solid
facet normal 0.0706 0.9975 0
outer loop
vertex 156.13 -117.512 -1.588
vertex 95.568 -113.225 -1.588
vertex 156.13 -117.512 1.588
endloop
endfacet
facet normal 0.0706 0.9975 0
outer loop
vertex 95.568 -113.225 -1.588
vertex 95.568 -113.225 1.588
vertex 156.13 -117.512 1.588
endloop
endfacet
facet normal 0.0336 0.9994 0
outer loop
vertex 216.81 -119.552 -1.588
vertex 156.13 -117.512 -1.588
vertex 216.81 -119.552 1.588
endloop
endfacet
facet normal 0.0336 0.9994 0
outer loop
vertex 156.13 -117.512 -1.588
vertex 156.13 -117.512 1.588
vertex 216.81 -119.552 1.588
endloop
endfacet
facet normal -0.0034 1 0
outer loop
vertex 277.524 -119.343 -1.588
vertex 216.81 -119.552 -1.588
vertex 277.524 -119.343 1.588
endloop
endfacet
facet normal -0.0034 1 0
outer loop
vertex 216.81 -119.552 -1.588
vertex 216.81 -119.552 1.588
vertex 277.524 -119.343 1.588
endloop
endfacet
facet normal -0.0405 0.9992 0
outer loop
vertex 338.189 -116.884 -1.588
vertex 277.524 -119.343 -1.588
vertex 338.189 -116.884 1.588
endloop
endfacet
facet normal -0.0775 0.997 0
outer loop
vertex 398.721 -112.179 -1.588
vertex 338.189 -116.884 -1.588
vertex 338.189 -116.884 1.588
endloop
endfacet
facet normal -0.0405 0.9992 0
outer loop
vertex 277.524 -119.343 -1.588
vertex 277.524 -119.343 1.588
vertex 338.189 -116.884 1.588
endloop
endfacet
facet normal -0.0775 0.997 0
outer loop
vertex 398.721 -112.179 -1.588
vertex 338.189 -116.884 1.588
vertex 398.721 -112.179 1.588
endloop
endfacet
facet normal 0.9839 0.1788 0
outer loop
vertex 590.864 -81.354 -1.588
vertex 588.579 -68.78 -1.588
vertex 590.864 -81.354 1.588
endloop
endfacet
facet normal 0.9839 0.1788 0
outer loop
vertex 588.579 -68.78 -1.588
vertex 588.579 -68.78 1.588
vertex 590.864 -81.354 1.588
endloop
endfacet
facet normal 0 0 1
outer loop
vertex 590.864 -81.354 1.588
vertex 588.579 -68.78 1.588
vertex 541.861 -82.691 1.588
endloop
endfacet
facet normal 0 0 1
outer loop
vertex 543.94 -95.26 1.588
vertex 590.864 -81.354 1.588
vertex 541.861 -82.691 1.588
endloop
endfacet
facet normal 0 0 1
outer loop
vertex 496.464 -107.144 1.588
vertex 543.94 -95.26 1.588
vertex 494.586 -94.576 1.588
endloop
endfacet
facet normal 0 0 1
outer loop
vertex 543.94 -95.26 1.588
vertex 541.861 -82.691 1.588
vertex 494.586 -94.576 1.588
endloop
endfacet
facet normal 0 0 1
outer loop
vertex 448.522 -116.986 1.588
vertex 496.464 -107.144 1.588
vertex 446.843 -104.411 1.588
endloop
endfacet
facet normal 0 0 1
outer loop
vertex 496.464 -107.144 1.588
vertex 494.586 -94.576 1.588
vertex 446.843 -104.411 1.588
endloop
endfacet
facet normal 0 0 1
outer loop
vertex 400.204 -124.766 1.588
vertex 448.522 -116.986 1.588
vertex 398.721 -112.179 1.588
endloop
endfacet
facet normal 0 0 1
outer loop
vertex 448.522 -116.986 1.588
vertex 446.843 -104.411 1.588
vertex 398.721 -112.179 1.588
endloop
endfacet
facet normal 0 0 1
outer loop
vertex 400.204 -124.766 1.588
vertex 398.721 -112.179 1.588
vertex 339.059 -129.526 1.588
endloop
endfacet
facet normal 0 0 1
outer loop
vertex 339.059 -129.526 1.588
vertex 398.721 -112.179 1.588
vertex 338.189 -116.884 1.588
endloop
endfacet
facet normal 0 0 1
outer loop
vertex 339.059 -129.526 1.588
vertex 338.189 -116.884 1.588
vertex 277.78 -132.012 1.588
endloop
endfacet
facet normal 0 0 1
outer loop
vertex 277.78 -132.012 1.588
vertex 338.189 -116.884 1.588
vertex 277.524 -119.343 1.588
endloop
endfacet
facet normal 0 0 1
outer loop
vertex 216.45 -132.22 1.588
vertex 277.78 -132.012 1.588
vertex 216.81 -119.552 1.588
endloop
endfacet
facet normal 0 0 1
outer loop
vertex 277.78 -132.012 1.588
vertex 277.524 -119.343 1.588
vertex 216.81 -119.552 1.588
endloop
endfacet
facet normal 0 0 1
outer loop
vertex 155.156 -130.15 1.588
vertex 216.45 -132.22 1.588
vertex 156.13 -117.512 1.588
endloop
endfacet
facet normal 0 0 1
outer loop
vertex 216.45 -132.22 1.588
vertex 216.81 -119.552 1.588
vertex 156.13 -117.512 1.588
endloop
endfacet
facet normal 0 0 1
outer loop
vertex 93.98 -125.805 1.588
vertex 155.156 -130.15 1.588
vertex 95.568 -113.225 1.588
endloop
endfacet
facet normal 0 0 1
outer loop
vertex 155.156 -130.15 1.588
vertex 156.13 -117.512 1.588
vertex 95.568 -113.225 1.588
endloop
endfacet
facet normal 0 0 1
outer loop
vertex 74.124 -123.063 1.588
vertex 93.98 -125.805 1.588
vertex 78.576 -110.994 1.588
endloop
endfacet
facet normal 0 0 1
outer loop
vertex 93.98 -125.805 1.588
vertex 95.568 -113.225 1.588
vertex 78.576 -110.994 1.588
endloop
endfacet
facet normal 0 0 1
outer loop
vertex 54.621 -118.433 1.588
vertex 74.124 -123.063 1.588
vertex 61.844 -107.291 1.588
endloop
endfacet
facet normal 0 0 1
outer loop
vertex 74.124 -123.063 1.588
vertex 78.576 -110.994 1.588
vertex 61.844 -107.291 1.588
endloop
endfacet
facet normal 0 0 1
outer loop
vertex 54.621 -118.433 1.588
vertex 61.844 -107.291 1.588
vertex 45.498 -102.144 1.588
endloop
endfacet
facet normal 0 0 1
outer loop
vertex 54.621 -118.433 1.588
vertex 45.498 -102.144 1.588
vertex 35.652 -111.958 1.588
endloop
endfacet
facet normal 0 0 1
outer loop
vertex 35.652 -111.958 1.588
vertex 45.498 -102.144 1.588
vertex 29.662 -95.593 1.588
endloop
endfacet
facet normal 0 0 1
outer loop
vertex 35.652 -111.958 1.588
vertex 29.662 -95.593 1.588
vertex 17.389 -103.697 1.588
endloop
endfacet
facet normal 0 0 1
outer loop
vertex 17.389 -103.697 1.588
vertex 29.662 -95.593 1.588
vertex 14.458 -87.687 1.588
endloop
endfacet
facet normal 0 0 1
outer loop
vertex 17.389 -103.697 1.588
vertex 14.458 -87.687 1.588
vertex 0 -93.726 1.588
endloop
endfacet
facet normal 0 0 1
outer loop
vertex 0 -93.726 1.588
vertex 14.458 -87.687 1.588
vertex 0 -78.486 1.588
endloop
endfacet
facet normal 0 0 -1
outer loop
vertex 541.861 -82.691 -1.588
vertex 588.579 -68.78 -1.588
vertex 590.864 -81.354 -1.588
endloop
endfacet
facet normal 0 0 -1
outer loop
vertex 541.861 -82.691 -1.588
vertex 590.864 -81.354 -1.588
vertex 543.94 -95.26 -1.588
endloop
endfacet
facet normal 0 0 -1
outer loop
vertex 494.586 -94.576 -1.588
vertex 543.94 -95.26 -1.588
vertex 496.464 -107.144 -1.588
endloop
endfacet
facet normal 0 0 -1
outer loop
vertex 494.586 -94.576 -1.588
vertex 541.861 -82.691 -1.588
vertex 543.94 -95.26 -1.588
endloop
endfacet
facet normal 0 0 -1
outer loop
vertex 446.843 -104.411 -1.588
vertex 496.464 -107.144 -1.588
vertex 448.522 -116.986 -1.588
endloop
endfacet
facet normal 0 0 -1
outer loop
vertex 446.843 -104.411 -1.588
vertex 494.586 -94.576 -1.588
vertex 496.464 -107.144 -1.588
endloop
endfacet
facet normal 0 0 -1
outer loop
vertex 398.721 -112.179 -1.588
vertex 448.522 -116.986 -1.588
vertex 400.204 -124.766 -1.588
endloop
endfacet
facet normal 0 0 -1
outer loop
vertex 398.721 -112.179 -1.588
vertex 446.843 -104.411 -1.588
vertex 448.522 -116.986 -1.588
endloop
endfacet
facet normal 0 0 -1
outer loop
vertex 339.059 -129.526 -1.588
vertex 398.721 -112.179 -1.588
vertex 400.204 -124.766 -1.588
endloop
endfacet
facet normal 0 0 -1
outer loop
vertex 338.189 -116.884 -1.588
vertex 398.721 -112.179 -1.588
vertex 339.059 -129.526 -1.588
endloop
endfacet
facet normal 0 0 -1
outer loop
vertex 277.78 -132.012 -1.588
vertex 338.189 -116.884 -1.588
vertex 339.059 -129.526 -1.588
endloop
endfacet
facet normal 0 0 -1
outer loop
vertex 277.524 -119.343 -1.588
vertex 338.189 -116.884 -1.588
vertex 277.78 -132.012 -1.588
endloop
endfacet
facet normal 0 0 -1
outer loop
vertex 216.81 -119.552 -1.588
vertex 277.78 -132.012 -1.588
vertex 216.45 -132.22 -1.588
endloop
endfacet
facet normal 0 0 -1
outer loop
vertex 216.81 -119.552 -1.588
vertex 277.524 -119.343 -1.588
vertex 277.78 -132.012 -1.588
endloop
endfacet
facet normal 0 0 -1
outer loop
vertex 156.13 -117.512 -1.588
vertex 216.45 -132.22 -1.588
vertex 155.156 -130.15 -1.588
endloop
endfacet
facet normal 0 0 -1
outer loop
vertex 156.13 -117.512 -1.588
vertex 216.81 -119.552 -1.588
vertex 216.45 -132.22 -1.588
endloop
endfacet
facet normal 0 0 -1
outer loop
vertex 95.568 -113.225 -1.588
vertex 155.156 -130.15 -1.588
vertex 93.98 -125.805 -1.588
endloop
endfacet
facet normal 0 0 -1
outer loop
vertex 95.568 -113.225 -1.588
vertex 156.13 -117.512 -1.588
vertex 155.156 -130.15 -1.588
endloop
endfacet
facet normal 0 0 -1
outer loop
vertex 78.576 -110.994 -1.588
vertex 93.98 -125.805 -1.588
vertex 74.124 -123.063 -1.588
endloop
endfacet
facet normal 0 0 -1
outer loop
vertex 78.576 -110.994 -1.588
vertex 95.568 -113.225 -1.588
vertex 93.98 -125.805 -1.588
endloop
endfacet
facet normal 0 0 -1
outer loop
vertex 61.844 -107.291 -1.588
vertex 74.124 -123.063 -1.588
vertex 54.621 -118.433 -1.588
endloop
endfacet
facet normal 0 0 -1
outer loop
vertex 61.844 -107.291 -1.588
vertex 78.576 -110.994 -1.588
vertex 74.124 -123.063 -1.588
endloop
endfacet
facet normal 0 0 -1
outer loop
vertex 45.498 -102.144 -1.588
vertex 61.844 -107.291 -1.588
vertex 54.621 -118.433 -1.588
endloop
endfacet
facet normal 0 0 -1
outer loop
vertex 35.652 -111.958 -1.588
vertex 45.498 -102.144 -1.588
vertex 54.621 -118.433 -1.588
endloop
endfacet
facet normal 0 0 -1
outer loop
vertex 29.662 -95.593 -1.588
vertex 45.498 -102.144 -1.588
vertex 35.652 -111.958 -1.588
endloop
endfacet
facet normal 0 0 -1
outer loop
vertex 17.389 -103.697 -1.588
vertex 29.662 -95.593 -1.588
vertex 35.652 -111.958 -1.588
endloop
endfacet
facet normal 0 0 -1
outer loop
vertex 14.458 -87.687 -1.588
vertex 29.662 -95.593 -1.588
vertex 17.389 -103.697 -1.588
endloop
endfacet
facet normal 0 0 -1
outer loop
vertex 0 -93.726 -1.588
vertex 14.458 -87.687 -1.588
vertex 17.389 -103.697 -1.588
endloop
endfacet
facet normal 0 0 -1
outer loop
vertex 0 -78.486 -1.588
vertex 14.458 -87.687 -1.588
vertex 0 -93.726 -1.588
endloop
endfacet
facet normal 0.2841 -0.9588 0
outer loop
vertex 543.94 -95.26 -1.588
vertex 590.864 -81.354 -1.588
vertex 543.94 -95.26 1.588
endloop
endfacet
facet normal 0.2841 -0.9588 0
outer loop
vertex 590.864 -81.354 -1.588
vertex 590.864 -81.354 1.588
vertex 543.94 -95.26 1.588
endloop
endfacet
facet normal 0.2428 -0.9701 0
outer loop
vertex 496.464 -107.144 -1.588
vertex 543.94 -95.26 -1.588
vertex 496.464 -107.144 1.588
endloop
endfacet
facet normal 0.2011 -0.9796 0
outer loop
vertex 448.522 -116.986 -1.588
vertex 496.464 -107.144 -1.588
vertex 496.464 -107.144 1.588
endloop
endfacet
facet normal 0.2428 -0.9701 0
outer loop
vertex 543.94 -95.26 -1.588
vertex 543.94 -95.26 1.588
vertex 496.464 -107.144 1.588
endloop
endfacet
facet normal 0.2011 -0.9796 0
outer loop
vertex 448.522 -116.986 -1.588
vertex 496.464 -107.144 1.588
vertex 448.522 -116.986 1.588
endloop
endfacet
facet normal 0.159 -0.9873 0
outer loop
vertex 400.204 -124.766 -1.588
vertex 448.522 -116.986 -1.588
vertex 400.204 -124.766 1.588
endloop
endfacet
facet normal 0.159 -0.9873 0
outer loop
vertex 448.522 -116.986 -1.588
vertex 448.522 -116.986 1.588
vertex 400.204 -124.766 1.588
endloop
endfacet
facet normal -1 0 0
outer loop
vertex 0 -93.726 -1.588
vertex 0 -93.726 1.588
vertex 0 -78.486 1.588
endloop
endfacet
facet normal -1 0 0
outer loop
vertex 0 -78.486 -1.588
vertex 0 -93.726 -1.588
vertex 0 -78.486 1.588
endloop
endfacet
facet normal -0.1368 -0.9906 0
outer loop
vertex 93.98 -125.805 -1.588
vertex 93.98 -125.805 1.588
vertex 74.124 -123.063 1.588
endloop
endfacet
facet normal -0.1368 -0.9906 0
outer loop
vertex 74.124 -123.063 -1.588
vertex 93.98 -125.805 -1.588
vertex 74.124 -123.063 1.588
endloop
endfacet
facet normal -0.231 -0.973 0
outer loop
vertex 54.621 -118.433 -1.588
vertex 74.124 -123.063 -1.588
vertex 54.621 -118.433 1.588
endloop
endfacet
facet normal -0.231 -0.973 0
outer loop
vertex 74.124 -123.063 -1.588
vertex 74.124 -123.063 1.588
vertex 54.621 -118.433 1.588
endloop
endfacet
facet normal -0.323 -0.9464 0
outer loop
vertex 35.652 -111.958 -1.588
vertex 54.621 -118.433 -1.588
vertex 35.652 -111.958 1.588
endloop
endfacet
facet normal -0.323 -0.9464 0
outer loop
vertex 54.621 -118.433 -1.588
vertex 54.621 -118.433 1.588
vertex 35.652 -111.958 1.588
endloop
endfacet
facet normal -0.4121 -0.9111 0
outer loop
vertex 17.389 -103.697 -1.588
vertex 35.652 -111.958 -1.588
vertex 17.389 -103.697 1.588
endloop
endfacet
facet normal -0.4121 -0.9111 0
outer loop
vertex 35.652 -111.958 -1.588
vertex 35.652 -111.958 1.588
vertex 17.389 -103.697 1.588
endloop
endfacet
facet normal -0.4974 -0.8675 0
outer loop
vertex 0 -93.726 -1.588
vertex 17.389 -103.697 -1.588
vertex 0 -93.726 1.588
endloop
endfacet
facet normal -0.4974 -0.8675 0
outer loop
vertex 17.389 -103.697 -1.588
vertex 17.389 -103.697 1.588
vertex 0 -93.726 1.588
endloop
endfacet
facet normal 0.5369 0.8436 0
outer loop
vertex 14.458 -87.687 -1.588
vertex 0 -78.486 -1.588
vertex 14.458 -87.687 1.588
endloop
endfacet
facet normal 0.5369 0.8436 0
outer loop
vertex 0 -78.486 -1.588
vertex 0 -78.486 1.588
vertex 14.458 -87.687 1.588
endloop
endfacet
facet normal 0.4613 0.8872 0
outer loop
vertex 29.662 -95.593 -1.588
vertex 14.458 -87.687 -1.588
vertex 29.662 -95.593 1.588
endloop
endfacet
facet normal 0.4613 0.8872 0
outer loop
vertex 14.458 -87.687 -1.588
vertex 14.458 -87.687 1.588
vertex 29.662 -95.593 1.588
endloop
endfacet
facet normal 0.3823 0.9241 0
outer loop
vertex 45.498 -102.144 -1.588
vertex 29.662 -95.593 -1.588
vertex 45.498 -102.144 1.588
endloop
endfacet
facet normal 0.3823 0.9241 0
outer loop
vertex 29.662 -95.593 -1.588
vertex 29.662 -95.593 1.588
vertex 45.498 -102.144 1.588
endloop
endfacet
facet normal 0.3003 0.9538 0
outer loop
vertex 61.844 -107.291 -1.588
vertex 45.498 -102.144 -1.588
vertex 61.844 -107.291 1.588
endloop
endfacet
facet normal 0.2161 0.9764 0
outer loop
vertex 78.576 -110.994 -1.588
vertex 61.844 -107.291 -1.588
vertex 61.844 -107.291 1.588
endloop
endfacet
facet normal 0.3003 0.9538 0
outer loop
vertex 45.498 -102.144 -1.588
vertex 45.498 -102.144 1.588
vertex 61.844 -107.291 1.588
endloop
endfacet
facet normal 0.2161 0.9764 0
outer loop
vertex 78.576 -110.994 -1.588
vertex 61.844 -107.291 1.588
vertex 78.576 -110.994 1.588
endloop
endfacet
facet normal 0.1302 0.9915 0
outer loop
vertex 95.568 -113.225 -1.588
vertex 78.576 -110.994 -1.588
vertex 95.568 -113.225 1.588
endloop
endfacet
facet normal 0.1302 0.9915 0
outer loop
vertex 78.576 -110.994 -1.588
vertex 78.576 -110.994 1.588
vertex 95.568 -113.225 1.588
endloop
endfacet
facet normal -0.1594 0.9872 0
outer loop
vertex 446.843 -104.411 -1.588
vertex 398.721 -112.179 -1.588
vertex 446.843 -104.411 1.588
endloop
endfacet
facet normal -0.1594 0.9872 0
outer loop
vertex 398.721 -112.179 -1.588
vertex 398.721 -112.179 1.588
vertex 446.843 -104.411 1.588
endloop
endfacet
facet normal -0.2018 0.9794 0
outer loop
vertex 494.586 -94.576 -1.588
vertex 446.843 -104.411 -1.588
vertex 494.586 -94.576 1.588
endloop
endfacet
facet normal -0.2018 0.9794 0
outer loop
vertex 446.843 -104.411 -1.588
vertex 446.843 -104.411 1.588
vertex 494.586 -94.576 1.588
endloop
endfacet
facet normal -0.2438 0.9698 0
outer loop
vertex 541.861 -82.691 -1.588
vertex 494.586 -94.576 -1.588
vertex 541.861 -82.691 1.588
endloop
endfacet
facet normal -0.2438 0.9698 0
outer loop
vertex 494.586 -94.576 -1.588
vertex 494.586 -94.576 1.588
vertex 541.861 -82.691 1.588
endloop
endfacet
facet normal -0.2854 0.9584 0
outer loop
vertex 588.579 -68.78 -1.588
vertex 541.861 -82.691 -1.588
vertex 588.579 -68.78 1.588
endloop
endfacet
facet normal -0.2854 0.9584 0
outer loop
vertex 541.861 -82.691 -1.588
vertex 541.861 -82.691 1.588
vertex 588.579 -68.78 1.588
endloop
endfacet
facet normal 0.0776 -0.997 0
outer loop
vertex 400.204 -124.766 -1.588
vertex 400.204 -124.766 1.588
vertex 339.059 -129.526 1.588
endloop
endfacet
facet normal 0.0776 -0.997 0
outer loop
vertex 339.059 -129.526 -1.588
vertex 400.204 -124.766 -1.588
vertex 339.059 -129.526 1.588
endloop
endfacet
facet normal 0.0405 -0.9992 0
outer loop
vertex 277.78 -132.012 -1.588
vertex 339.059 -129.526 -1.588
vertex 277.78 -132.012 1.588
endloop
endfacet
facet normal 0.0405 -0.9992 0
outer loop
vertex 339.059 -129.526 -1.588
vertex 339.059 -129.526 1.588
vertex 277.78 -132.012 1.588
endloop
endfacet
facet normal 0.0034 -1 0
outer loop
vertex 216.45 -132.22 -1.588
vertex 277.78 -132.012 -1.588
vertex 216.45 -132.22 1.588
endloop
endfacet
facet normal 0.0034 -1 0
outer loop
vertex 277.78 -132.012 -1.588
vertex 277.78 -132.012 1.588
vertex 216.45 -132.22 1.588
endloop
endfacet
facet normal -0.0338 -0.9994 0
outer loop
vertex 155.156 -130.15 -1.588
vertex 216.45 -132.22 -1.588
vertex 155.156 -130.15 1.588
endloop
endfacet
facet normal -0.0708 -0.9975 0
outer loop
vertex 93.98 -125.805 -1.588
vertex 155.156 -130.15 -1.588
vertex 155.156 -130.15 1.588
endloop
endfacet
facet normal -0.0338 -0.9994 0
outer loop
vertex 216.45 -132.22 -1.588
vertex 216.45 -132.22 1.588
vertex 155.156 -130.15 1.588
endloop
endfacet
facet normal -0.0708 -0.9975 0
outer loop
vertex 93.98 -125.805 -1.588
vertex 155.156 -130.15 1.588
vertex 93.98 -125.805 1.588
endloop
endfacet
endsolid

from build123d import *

# Parameters (mm, degrees)
BOSS_EXTRUDE1_DEPTH = 1.5875


with BuildPart() as part:
    # Sketch2 → Boss-Extrude1 (new, symmetric)
    with BuildSketch(Plane.XY):
        with BuildLine():
            Line((0, -93.726), (0, -78.486))
            ThreePointArc((0, -78.486), (45.497909529, -102.143988159), (95.5675, -113.225336692))
            ThreePointArc((95.5675, -113.225336692), (247.168367606, -119.728946816), (398.720709803, -112.17861051))
            ThreePointArc((398.720709803, -112.17861051), (494.586291489, -94.575813643), (588.578984507, -68.779653684))
            Line((588.578984507, -68.779653684), (590.864339182, -81.353629169))
            ThreePointArc((590.864339182, -81.353629169), (496.464017617, -107.14437724), (400.203586993, -124.765753286))
            ThreePointArc((400.203586993, -124.765753286), (247.115945932, -132.400573942), (93.98, -125.805242584))
            ThreePointArc((93.98, -125.805242584), (45.058861039, -115.423125179), (0, -93.726))
        make_face()
    extrude(amount=BOSS_EXTRUDE1_DEPTH, both=True)


solid = part.part
